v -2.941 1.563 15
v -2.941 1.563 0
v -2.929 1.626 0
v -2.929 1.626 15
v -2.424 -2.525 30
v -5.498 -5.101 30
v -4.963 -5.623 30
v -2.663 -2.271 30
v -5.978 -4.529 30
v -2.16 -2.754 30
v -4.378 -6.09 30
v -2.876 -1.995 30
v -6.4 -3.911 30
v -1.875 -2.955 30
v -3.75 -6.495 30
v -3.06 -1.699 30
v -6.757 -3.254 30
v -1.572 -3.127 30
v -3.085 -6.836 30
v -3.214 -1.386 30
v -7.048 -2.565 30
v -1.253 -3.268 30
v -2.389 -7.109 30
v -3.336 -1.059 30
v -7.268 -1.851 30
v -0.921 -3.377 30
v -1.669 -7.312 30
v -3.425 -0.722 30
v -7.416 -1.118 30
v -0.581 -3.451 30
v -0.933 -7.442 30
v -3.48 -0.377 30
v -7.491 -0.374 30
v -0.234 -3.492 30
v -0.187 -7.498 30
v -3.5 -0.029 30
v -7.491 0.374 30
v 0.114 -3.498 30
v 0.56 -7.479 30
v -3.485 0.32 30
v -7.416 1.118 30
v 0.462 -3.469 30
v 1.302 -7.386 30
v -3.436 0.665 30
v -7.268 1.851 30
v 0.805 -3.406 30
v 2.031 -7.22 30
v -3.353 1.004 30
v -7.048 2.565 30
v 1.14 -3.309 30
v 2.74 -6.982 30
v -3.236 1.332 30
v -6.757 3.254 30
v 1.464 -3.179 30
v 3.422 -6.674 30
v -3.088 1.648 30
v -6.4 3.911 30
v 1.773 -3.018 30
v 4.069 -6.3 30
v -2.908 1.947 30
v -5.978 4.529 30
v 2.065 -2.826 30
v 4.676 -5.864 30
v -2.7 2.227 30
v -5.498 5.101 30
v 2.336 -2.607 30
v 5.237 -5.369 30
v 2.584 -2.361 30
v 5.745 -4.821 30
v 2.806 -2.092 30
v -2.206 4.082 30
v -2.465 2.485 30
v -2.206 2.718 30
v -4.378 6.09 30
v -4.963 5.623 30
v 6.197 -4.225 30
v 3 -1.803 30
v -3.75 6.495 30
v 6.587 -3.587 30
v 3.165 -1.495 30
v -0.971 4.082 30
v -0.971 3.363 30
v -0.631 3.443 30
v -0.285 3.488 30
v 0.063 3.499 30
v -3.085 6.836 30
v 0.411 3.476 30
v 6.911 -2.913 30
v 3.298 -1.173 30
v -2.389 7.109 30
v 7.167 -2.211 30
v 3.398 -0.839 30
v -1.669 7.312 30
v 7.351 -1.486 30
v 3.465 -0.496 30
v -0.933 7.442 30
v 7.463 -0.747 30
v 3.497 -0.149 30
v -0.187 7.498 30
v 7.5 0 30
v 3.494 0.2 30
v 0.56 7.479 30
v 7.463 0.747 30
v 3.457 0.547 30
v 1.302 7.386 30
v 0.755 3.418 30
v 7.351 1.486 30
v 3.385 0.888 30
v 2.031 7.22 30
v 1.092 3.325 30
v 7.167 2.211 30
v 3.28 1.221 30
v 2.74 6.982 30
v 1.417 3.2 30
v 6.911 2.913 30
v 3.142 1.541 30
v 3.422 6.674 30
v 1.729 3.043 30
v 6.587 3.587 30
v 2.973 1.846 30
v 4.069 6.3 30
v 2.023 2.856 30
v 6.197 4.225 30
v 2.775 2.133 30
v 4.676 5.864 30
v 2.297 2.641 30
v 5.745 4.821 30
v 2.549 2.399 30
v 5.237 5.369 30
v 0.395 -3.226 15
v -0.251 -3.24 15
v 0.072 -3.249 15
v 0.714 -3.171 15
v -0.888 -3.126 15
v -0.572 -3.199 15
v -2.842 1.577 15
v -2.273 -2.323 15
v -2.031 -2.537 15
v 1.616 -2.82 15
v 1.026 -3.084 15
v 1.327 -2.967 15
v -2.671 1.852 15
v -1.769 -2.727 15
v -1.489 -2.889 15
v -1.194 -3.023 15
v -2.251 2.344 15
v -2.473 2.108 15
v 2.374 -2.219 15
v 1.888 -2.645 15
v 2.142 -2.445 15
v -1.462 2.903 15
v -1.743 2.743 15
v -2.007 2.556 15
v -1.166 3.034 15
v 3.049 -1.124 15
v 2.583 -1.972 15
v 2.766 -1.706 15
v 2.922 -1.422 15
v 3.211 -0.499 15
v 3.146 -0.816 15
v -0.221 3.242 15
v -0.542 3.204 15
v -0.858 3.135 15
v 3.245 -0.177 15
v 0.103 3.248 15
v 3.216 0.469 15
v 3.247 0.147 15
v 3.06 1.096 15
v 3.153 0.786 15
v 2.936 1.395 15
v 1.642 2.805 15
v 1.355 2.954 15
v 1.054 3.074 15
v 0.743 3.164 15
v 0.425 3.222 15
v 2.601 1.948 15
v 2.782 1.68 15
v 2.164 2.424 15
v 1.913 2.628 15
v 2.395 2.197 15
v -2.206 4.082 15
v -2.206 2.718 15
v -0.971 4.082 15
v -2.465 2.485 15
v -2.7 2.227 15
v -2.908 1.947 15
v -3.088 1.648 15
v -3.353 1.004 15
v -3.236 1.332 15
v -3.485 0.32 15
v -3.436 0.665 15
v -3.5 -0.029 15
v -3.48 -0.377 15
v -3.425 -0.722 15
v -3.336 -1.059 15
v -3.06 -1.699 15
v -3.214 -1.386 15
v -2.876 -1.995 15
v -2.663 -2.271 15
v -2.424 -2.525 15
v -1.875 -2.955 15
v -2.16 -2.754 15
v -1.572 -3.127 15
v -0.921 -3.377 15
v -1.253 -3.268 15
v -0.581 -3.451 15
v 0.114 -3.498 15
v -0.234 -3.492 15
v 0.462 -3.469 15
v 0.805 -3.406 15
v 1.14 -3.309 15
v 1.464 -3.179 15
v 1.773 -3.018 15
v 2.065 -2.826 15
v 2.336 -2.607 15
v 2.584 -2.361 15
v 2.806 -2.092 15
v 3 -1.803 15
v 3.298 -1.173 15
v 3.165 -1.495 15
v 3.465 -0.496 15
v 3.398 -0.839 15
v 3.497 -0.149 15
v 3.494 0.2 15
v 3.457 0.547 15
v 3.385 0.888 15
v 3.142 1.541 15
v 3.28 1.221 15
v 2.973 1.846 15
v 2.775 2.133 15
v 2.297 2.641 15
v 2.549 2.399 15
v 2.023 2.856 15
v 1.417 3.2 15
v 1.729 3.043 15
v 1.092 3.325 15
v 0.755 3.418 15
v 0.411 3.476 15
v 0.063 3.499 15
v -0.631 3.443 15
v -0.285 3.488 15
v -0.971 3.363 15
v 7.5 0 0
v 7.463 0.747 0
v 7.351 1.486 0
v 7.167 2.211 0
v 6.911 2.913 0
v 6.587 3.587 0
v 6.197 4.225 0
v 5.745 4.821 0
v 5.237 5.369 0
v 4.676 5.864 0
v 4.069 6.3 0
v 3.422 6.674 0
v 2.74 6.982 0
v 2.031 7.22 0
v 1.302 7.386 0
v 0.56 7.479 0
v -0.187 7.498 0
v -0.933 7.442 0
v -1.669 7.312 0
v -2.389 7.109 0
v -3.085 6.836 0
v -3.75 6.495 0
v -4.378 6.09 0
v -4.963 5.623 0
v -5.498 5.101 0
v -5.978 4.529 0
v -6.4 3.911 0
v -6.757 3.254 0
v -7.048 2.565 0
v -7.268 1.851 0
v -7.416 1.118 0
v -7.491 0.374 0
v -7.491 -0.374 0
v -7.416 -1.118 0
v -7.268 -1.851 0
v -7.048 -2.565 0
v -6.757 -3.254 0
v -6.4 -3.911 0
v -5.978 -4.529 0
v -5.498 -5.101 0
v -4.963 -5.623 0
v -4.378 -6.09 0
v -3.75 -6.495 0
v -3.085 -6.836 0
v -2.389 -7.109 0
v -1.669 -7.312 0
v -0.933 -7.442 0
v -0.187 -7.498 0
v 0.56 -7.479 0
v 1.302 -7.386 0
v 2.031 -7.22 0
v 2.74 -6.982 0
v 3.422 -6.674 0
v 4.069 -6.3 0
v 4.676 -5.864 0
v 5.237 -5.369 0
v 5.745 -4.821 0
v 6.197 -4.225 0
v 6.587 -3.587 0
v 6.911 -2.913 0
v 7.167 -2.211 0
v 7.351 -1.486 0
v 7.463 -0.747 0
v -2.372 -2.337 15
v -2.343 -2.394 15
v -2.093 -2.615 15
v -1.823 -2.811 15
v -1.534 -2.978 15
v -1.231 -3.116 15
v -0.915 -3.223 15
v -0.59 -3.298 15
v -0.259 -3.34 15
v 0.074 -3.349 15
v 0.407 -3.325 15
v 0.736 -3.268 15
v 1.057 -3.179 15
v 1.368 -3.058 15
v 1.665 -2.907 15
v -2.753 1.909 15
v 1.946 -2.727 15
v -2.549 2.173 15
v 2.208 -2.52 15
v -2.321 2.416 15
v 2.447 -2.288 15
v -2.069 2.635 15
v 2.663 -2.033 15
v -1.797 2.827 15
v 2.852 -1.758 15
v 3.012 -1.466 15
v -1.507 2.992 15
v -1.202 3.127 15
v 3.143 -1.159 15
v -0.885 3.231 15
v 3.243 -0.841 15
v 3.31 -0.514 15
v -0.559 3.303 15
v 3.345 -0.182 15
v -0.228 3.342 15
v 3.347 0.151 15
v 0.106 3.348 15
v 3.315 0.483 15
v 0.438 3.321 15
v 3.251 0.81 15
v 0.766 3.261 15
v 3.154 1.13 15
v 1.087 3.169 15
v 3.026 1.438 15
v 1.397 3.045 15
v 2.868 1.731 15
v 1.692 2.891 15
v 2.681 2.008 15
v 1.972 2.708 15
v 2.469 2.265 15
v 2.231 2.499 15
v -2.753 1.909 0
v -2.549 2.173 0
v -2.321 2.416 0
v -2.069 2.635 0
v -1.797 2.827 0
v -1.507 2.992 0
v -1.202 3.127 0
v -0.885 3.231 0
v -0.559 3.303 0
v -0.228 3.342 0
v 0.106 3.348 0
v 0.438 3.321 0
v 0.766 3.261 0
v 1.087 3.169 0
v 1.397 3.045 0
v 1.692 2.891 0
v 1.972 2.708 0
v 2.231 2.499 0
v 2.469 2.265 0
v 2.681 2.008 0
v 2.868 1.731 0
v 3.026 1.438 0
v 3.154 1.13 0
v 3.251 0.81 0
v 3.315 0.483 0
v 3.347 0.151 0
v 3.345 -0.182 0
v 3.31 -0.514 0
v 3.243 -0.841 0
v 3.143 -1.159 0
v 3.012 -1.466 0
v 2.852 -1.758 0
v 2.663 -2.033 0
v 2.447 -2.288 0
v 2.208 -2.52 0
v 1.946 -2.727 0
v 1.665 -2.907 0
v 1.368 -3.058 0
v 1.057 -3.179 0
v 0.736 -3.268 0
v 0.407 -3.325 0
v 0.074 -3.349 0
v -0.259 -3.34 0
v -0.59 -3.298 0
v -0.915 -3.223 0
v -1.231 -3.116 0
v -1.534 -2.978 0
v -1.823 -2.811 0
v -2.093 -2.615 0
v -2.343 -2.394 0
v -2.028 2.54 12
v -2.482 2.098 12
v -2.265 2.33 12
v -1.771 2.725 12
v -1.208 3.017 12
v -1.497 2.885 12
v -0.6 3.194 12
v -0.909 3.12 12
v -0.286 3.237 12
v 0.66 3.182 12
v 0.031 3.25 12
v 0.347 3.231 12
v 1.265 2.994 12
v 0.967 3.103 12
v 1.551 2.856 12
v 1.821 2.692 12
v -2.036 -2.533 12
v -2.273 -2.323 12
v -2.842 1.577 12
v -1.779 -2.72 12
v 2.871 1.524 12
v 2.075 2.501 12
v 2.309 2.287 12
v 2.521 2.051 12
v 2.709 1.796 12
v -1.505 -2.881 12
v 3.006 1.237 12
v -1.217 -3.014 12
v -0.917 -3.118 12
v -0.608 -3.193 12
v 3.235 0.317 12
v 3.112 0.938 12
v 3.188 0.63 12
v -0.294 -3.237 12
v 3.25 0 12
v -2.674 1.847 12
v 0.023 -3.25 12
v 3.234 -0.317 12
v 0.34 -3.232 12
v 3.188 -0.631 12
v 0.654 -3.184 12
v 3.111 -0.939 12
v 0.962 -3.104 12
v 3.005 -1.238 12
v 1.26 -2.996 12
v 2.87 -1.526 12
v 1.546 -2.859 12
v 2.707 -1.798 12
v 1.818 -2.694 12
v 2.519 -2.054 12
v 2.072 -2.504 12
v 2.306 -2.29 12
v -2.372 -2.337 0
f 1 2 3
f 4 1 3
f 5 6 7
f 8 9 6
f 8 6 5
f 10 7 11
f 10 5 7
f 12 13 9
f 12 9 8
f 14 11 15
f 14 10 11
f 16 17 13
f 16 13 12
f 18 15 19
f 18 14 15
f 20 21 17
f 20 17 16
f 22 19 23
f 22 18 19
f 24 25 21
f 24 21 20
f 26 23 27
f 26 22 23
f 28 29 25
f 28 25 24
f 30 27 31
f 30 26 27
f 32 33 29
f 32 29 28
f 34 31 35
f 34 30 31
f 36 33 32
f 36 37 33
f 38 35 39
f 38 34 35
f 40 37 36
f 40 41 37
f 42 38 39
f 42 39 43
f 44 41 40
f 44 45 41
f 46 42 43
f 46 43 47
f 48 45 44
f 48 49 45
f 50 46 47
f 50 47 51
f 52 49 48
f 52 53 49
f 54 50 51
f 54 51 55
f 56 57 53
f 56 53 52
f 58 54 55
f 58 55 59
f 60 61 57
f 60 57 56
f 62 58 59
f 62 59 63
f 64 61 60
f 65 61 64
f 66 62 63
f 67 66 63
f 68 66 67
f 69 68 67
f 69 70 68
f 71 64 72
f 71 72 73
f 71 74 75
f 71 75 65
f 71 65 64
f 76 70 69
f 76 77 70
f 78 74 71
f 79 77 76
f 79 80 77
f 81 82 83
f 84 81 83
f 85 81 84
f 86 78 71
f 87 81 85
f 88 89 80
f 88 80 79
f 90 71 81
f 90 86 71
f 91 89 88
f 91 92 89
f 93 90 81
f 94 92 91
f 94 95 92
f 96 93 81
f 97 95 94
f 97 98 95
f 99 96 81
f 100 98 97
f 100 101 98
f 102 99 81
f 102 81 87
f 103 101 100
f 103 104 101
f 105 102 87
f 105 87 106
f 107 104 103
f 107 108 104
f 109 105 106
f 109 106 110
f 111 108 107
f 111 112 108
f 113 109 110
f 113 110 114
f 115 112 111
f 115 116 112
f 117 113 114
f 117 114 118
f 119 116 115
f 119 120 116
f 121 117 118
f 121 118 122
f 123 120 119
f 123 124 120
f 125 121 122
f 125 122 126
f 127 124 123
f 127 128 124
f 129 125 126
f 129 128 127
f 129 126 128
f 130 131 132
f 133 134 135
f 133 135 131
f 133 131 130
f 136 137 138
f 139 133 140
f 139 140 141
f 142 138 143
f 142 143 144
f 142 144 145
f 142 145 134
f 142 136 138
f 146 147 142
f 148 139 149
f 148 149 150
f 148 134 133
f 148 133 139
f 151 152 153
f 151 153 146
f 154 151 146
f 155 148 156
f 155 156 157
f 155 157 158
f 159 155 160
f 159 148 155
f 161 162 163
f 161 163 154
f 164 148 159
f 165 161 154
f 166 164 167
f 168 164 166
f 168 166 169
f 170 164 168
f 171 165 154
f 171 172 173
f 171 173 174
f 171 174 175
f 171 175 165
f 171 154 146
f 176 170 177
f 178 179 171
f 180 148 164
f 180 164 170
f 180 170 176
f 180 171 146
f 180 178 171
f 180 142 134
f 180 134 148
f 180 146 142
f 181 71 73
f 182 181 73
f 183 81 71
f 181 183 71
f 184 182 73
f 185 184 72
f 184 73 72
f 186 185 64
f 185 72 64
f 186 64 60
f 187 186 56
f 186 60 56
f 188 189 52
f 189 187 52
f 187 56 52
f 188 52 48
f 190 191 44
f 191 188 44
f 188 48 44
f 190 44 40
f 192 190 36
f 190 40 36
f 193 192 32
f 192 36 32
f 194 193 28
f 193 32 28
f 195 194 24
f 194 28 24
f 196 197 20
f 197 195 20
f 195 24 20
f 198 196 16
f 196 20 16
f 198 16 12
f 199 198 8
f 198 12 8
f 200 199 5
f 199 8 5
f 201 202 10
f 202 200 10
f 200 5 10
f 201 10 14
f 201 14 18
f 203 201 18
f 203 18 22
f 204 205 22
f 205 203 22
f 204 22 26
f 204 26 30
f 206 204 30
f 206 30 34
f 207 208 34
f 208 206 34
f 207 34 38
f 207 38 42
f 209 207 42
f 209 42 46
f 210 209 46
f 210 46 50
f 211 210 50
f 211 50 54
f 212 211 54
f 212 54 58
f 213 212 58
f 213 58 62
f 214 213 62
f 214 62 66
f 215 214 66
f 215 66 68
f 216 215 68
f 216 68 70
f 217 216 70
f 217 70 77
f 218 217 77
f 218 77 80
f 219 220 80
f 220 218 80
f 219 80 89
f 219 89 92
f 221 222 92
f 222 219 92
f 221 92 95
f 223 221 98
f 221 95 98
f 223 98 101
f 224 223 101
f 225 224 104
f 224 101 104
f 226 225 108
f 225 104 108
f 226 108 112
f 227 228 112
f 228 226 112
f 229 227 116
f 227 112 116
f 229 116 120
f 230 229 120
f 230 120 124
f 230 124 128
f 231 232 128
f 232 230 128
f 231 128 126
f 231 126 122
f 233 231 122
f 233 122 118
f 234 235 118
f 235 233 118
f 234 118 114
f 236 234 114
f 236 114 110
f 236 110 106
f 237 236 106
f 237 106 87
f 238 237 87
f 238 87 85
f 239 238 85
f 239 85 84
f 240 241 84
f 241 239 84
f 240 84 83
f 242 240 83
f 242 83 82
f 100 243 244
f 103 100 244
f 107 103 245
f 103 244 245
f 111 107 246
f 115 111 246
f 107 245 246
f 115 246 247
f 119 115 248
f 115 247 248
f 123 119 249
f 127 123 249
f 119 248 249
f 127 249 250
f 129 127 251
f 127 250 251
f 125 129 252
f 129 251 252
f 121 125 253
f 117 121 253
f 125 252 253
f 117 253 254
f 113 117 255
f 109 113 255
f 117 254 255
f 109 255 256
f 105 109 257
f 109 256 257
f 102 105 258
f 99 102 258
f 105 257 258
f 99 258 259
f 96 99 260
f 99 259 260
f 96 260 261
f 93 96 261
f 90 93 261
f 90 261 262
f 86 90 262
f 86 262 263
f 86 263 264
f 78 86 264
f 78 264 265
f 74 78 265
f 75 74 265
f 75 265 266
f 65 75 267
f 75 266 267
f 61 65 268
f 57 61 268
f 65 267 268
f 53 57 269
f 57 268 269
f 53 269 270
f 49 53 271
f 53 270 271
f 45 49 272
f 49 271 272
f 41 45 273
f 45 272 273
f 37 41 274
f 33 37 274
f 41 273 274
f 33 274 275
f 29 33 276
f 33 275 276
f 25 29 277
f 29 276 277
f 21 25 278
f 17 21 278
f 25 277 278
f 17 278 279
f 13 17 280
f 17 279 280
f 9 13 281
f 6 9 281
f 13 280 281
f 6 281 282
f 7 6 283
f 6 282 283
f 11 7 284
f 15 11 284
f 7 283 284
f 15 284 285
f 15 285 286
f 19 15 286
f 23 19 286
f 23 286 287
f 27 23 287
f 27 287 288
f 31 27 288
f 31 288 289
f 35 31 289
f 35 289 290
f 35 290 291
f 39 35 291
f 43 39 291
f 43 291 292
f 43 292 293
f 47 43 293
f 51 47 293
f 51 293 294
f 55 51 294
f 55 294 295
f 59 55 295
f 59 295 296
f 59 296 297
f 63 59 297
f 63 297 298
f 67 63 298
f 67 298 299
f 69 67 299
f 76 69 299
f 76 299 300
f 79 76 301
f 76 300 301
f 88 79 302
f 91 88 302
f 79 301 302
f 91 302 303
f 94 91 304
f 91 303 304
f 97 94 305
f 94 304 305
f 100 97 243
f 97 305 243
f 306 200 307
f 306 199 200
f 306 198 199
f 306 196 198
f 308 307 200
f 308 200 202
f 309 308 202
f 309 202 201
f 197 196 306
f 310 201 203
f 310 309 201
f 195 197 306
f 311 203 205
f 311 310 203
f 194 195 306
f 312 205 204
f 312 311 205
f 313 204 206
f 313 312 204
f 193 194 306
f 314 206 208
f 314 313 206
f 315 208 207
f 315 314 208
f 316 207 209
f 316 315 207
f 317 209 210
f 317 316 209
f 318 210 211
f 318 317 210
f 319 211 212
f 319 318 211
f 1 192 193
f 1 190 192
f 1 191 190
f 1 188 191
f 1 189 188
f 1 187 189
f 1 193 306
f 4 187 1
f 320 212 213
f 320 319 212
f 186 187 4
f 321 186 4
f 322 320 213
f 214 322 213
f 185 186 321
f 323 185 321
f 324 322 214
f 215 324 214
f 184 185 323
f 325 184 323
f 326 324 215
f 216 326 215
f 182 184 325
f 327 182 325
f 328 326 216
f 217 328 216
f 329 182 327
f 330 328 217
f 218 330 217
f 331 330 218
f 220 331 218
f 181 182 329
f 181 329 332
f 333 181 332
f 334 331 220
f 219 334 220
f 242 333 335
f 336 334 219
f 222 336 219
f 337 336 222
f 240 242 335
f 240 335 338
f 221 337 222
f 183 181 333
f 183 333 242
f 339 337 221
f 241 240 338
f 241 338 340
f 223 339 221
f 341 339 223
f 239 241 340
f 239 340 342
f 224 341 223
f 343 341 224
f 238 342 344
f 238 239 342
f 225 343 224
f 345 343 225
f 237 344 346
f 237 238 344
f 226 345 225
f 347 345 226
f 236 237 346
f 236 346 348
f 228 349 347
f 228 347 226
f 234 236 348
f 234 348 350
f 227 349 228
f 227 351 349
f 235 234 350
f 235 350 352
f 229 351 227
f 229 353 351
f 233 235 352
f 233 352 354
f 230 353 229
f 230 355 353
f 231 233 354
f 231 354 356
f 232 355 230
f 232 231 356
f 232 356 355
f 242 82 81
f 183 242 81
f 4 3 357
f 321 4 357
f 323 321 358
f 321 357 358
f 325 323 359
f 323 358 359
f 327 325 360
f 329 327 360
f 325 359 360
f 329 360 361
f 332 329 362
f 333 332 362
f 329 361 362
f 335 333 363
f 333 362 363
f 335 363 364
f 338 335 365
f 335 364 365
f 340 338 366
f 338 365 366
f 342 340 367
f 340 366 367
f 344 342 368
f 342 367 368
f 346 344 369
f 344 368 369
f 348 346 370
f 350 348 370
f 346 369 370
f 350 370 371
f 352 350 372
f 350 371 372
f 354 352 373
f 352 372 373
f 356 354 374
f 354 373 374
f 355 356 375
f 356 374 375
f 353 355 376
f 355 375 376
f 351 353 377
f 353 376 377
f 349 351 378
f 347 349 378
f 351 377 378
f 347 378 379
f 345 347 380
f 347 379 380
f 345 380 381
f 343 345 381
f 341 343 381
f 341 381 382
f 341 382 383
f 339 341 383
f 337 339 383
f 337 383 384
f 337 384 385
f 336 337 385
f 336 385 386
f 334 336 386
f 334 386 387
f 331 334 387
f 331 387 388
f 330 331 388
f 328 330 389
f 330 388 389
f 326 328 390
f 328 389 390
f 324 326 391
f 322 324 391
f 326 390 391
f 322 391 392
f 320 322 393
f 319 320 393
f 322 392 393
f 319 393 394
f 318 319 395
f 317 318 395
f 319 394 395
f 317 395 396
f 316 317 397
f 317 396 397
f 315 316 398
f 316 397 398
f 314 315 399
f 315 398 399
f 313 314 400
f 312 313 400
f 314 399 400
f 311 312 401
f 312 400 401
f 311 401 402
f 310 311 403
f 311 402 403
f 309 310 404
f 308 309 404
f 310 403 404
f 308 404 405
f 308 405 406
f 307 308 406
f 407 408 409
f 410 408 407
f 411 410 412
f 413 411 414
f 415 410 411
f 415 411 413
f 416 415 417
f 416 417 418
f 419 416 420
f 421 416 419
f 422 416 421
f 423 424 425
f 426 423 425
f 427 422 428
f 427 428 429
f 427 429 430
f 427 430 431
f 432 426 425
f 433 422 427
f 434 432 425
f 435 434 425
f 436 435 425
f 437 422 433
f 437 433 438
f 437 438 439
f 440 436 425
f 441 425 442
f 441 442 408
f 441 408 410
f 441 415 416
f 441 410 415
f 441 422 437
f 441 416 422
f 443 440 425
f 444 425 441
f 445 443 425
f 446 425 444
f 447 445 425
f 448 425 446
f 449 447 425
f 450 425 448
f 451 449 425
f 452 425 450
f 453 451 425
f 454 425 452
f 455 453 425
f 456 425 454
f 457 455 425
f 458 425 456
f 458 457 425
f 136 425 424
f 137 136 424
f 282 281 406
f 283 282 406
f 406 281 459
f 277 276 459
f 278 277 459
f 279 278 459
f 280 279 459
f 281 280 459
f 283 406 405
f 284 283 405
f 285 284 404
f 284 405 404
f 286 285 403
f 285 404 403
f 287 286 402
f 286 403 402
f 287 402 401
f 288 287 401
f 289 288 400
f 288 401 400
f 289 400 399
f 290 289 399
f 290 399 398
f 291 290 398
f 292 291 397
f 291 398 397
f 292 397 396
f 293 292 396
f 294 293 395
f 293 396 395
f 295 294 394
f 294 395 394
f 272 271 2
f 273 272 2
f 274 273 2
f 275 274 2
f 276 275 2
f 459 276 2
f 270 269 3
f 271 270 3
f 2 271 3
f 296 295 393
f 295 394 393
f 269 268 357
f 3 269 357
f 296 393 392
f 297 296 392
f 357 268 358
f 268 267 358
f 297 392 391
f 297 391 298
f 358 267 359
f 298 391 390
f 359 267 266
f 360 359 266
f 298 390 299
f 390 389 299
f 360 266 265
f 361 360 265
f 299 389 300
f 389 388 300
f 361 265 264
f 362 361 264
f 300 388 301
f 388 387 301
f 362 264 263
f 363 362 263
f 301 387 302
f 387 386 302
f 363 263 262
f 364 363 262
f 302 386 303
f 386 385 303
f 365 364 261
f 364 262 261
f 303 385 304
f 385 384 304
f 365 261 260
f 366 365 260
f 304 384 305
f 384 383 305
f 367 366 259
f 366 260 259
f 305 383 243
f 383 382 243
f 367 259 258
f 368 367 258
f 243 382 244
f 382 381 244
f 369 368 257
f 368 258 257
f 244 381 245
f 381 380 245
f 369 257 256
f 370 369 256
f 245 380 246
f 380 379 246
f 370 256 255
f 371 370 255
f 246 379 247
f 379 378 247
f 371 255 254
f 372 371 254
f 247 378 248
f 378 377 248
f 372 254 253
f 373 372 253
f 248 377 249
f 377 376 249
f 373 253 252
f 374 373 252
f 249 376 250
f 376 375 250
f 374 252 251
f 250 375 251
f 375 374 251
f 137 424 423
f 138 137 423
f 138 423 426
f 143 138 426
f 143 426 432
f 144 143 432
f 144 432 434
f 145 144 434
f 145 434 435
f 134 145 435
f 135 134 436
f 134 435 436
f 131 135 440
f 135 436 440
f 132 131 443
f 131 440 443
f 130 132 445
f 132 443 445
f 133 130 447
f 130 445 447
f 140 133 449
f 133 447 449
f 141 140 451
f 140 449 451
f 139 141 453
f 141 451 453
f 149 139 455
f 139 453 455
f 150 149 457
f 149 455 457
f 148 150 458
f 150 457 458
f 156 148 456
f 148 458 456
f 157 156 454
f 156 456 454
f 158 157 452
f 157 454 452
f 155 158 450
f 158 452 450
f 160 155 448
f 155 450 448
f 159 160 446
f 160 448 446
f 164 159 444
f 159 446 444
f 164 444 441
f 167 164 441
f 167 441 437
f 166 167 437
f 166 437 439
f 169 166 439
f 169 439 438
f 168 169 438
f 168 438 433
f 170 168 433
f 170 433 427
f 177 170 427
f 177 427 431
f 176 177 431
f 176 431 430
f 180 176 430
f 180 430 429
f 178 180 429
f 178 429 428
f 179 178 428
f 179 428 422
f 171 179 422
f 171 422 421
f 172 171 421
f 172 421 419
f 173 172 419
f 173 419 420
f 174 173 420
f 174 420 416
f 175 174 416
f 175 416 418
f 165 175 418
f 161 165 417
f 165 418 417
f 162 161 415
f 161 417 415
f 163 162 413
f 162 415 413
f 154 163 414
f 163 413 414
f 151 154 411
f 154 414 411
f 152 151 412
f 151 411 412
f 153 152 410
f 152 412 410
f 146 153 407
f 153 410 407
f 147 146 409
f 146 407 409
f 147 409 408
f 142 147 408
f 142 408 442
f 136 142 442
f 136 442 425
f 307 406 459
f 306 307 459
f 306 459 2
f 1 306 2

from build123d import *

# Parameters (mm, degrees)
F0_R      = 7.5
F1_DEPTH  = 30
F2_R      = 3.5
F3_DEPTH  = 15
F5_DEPTH  = 12
F7_DEPTH  = 12
F8_DEPTH  = 3
F10_DEPTH = 15


with BuildPart() as f1:
    # F0 (on Top) → F1 (new body)
    with BuildSketch(Plane.XY):
        Circle(F0_R)
    extrude(amount=F1_DEPTH)

    # F2 (on face) → F3 (cut)
    with BuildSketch(Plane.XY.offset(30)):
        Circle(F2_R)
    extrude(amount=-F3_DEPTH, mode=Mode.SUBTRACT)

    # F4 (on face) → F5 (cut)
    with BuildSketch(Plane(origin=(0, 0, 0), x_dir=(1, 0, 0), z_dir=(0, 0, -1))):
        with BuildLine():
            ThreePointArc((-2.8416053494, -1.5772694882), (0.8146418276, -3.1462451737), (3.25, 0))
            ThreePointArc((3.25, 0), (1.2598831128, 2.9958629044), (-2.2731966412, 2.3227305118))
            Line((-2.2731966412, 2.3227305118), (-2.8416053494, -1.5772694882))
        make_face()
    extrude(amount=-F5_DEPTH, mode=Mode.SUBTRACT)

    # F6 (on face) → F7 (cut)
    with BuildSketch(Plane.XY.offset(30)):
        with BuildLine():
            Line((-2.2055036746, 4.0815616958), (-2.2055036746, 2.7176742891))
            ThreePointArc((-2.2055036746, 2.7176742891), (-1.6205201656, 3.1022434451), (-0.9707027348, 3.3626977564))
            Line((-0.9707027348, 3.3626977564), (-0.9707027348, 4.0815616958))
            Line((-0.9707027348, 4.0815616958), (-2.2055036746, 4.0815616958))
        make_face()
    extrude(amount=-F7_DEPTH, mode=Mode.SUBTRACT)

    # F8 (cut): a face of the model
    f8_faces = [f1.faces().sort_by_distance(p)[0] for p in [
        (-1.6545482577, 3.5698041103, 18),
    ]]
    extrude(f8_faces, amount=-F8_DEPTH, mode=Mode.SUBTRACT)

    # F9 (on face) → F10 (cut, through all)
    with BuildSketch(Plane(origin=(0, 0, 0), x_dir=(1, 0, 0), z_dir=(0, 0, -1))):
        with BuildLine():
            Line((-2.9405598837, -1.5628472782), (-2.9290393601, -1.6258008571))
            ThreePointArc((-2.9290393601, -1.6258008571), (3.3149768991, -0.4831440351), (-2.3431411533, 2.3941991429))
            Line((-2.3431411533, 2.3941991429), (-2.3721511755, 2.3371527218))
            Line((-2.3721511755, 2.3371527218), (-2.9405598837, -1.5628472782))
        make_face()
        with BuildLine():
            Line((-2.8416053494, -1.5772694882), (-2.2731966412, 2.3227305118))
            ThreePointArc((-2.2731966412, 2.3227305118), (3.2160223648, -0.4687218251), (-2.8416053494, -1.5772694882))
        make_face(mode=Mode.SUBTRACT)
    extrude(amount=-F10_DEPTH, mode=Mode.SUBTRACT)


solid = f1.part
